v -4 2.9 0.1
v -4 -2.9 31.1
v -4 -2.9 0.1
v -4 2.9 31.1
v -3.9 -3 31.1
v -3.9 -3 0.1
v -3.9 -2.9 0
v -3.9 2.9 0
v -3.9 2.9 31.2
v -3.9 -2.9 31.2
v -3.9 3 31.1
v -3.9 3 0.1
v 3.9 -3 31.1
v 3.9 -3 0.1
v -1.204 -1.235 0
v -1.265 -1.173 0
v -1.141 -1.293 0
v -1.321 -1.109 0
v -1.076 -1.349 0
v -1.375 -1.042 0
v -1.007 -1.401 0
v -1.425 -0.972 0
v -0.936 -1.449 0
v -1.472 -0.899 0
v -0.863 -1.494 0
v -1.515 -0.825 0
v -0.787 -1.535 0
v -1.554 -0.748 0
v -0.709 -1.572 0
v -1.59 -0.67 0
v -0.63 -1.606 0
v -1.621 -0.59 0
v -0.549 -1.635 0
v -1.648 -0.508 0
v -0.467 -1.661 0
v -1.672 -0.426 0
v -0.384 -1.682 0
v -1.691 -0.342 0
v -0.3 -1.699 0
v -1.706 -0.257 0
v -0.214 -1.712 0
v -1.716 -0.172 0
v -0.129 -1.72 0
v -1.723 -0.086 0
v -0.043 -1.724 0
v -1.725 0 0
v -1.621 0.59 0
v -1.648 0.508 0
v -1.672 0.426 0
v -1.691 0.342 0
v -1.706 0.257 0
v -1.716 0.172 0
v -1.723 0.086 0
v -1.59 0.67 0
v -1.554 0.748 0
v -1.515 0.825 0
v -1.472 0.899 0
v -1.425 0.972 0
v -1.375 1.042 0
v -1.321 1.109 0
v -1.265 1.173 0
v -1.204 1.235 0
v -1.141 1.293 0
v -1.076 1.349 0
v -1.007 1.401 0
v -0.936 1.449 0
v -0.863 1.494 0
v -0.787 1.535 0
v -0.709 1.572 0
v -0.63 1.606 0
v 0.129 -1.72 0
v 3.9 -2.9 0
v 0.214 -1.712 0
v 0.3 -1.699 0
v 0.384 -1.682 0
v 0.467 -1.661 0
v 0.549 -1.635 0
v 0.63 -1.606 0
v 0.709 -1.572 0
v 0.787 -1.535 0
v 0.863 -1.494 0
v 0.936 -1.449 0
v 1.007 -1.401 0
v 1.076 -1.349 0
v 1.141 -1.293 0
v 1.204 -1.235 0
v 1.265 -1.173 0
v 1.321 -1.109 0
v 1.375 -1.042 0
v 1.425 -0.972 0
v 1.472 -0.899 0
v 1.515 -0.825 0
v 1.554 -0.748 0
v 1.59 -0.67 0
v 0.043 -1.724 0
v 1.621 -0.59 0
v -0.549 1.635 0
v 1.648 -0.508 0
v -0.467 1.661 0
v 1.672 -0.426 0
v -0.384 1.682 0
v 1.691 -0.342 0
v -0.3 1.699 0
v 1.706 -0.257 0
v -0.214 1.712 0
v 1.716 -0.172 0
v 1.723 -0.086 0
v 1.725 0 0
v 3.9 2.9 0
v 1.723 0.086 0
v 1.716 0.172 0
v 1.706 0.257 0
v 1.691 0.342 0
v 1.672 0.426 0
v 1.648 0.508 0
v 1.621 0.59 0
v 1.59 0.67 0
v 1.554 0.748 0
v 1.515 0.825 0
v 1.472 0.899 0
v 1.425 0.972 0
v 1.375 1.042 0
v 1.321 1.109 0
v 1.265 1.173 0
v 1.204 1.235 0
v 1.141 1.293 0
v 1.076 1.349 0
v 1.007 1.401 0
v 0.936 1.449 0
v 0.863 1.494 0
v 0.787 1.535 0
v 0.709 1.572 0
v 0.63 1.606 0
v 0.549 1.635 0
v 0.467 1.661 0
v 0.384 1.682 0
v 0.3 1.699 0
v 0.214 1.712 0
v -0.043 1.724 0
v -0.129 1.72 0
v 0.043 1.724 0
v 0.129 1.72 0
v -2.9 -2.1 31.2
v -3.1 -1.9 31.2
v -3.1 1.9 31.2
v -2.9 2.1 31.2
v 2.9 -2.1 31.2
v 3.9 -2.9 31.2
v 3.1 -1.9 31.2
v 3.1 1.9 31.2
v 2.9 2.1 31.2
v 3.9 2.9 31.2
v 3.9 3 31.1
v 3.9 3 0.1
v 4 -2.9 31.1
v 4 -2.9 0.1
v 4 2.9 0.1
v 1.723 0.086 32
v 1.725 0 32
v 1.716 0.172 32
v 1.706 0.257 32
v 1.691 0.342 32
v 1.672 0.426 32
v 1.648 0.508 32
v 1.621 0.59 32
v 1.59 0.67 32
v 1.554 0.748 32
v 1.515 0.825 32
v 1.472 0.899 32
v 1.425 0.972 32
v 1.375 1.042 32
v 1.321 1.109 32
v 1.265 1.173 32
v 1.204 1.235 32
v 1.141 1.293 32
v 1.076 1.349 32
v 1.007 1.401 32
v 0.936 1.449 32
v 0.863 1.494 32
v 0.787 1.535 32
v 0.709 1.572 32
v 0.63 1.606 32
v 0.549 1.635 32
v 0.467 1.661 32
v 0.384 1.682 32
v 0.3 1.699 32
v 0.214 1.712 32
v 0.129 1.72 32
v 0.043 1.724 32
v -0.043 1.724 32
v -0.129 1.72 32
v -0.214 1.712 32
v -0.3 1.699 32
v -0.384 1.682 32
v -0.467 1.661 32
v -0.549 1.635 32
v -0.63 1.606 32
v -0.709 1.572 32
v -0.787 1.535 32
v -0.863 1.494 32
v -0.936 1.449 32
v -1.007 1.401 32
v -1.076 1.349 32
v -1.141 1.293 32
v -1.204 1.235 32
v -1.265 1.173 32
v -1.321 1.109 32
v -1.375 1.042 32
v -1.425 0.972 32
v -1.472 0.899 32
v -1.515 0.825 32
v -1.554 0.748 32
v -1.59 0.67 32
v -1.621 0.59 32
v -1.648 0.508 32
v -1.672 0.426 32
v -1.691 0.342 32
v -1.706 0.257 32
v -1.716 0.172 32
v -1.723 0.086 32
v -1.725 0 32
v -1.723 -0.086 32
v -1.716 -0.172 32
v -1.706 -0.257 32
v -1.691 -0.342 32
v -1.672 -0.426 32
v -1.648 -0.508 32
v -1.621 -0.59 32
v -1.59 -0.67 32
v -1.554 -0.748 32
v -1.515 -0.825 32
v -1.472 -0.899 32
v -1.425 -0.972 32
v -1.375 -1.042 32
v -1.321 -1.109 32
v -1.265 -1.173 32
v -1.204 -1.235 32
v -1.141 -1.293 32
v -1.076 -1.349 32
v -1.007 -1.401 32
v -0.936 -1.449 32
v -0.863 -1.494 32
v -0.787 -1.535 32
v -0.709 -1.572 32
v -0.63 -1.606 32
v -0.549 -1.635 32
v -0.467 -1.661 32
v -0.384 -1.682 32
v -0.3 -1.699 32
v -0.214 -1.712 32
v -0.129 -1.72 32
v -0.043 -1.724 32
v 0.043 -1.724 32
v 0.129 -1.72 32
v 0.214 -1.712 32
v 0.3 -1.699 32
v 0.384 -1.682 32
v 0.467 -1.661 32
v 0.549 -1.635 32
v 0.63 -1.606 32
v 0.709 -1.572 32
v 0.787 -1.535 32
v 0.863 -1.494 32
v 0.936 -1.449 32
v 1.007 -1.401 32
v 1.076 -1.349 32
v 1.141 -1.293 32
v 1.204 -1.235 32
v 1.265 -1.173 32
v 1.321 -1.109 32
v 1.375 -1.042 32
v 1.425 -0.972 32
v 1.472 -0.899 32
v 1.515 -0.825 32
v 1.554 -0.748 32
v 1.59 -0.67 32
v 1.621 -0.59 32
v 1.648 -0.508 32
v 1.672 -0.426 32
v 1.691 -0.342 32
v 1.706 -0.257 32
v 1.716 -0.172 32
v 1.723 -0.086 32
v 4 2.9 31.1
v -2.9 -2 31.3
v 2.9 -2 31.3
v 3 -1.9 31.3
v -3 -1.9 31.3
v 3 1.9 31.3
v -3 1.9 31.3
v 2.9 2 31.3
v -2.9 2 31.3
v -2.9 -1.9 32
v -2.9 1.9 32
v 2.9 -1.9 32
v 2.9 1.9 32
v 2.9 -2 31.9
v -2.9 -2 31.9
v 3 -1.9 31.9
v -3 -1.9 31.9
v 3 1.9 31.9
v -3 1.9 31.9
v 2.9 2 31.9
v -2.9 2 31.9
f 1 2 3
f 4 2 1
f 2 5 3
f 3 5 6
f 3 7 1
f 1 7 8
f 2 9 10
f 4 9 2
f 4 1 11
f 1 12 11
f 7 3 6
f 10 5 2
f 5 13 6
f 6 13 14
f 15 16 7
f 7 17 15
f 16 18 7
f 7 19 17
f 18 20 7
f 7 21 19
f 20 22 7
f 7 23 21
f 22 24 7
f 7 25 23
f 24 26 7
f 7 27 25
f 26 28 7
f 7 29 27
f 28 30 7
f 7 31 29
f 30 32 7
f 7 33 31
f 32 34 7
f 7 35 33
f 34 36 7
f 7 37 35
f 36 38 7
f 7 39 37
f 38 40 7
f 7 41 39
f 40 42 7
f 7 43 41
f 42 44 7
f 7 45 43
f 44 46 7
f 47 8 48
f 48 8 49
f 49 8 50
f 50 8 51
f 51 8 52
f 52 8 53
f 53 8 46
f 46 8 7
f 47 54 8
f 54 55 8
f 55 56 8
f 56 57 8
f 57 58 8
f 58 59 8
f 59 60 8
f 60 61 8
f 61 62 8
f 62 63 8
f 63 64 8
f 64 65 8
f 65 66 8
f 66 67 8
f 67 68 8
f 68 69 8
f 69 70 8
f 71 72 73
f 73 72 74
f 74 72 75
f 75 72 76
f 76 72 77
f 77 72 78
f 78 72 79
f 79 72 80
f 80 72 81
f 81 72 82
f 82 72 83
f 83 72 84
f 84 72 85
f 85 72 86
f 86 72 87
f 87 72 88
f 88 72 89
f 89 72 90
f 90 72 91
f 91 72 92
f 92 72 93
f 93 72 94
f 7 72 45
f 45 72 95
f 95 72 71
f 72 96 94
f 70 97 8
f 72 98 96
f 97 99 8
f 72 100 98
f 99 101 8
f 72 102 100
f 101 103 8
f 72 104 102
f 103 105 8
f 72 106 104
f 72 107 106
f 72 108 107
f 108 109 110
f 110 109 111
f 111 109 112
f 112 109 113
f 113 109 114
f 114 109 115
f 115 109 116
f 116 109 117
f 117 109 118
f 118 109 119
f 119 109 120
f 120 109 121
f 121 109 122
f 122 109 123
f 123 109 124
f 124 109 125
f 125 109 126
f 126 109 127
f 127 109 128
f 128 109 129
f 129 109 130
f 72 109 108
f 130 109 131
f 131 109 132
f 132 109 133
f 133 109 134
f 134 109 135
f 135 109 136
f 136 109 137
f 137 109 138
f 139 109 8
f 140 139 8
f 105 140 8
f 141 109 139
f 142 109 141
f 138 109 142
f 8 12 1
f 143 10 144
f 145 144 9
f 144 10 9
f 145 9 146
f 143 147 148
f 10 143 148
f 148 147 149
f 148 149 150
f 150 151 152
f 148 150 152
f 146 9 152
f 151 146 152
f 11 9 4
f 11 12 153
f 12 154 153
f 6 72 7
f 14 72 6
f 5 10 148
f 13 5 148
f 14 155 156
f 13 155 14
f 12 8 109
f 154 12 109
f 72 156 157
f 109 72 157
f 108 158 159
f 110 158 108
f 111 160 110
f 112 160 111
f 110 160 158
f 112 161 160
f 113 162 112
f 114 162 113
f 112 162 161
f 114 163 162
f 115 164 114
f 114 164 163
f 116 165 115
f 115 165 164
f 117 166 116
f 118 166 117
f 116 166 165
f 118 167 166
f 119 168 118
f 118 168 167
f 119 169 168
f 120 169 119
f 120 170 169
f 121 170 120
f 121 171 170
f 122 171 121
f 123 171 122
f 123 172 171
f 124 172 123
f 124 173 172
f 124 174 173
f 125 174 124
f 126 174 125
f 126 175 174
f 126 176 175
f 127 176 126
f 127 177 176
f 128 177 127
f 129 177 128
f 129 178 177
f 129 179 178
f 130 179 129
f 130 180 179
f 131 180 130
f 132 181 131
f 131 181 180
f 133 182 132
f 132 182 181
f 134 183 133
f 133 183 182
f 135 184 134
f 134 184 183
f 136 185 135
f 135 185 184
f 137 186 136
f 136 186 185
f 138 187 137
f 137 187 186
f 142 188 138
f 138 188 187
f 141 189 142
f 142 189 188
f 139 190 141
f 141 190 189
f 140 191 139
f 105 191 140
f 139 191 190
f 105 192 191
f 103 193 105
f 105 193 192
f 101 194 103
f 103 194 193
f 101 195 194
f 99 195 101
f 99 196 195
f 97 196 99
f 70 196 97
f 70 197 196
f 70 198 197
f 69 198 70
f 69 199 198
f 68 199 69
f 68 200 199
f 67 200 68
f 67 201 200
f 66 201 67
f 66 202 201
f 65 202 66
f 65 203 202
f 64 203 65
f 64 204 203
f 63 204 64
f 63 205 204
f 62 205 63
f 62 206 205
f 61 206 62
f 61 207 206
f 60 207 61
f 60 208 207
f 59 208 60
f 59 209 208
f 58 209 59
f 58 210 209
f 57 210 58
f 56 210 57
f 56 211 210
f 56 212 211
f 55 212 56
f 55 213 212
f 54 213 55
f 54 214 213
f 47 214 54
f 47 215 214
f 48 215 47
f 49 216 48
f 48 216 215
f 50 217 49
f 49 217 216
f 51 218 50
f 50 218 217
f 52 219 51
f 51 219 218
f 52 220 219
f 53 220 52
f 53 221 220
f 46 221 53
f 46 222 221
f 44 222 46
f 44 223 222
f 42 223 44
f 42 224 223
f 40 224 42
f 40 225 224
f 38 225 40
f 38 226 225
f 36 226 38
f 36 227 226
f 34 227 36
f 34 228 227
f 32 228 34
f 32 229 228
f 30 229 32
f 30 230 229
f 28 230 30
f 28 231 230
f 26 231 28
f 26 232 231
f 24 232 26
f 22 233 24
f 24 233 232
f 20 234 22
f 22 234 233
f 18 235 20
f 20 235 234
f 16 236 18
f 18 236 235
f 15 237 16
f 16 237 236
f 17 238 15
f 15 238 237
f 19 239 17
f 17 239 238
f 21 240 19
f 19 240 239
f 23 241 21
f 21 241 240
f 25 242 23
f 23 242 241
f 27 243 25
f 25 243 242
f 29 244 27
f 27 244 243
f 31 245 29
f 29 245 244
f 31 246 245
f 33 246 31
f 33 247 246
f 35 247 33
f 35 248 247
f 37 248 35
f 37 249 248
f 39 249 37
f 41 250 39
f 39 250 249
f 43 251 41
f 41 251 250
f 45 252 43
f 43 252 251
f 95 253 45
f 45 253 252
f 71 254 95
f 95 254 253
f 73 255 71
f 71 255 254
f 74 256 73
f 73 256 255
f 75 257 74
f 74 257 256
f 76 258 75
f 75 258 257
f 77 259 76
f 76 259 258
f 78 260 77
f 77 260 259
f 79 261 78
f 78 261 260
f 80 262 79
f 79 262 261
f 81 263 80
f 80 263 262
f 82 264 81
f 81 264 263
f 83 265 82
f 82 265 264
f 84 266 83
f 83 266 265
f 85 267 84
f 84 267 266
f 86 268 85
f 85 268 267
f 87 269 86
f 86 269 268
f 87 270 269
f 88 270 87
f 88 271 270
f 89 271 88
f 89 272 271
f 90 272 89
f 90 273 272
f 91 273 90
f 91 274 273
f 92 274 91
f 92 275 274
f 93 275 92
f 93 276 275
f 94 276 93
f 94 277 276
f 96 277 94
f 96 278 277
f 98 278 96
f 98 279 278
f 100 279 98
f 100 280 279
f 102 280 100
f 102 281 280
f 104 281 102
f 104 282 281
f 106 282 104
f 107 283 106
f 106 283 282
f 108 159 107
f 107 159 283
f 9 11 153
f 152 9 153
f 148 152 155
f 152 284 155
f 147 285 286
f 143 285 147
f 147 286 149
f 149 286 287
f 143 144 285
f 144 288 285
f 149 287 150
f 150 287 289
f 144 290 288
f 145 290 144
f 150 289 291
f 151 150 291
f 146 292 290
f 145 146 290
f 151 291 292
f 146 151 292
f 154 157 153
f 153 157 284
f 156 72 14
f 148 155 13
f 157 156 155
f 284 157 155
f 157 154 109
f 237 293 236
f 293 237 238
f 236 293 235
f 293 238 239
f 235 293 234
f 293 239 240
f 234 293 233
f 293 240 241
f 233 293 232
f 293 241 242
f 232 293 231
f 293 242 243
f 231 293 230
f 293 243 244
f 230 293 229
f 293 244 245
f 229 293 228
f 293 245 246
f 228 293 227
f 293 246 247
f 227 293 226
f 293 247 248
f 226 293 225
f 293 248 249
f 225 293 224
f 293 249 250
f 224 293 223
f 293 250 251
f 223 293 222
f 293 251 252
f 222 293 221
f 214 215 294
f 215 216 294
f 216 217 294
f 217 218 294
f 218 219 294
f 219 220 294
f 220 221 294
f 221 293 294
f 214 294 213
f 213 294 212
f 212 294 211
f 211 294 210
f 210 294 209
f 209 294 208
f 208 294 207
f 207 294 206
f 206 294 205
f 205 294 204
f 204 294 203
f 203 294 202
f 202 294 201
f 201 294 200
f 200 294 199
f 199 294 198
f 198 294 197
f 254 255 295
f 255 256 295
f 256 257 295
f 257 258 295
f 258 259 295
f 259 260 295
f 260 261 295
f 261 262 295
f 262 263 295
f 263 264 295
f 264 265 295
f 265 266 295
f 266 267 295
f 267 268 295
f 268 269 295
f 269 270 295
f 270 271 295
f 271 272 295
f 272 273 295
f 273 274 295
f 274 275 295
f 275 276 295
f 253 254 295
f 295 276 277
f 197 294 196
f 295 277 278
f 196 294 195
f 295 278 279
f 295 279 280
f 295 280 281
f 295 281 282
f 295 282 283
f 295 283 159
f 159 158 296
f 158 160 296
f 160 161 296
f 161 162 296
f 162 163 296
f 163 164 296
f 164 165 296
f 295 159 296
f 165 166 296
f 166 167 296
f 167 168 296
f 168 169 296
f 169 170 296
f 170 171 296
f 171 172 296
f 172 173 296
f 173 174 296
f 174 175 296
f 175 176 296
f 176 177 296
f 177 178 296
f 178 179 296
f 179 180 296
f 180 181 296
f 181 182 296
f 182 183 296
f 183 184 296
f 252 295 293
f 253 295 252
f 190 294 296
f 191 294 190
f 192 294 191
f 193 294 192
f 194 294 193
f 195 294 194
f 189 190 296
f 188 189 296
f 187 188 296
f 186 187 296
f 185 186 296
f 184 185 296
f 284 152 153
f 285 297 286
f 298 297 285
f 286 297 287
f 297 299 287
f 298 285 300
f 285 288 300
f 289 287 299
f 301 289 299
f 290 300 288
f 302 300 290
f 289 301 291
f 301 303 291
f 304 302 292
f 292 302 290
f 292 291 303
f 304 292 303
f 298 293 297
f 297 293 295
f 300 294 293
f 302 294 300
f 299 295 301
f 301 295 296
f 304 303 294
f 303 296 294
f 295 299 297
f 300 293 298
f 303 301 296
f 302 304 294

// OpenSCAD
// Generated by spec/build_parent_gnss.py; dimensions and edge finishing are parametric there.
polyhedron(points=[[-4.0, -2.9000000953674316, 0.10000000149011612], [-4.0, -2.9000000953674316, 31.100000381469727], [-4.0, 2.9000000953674316, 0.10000000149011612], [-4.0, 2.9000000953674316, 31.100000381469727], [-3.9000000953674316, -3.0, 31.100000381469727], [-3.9000000953674316, -3.0, 0.10000000149011612], [-3.9000000953674316, -2.9000000953674316, -1.942890293094024e-16], [-3.9000000953674316, 2.9000000953674316, -1.9081958235744878e-16], [-3.9000000953674316, -2.9000000953674316, 31.200000762939453], [-3.9000000953674316, 2.9000000953674316, 31.200000762939453], [-3.9000000953674316, 3.0, 31.100000381469727], [-3.9000000953674316, 3.0, 0.10000000149011612], [3.9000000953674316, -3.0, 31.100000381469727], [3.9000000953674316, -3.0, 0.10000000149011612], [-1.264514446258545, -1.1732980012893677, 0.0], [-1.204458475112915, -1.2348703145980835, 0.0], [-1.141408085823059, -1.293372631072998, 0.0], [-1.3214266300201416, -1.1088086366653442, 0.0], [-1.0755199193954468, -1.3486592769622803, 0.0], [-1.3750535249710083, -1.041562557220459, 0.0], [-1.0069578886032104, -1.4005930423736572, 0.0], [-1.4252618551254272, -0.9717270731925964, 0.0], [-0.9358922839164734, -1.4490447044372559, 0.0], [-1.4719268083572388, -0.8994757533073425, 0.0], [-0.862500011920929, -1.4938938617706299, 0.0], [-1.5149321556091309, -0.8249881267547607, 0.0], [-0.7869634032249451, -1.5350288152694702, 0.0], [-1.5541713237762451, -0.748449444770813, 0.0], [-0.709470272064209, -1.572347640991211, 0.0], [-1.5895464420318604, -0.6700500249862671, 0.0], [-0.6302132606506348, -1.605757236480713, 0.0], [-1.6209697723388672, -0.5899847745895386, 0.0], [-0.5493894815444946, -1.6351746320724487, 0.0], [-1.6483631134033203, -0.5084526538848877, 0.0], [-0.46719980239868164, -1.6605268716812134, 0.0], [-1.6716582775115967, -0.4256564974784851, 0.0], [-0.3838486075401306, -1.6817506551742554, 0.0], [-1.6907975673675537, -0.34180209040641785, 0.0], [-0.2995431125164032, -1.6987934112548828, 0.0], [-1.7057331800460815, -0.25709789991378784, 0.0], [-0.21449288725852966, -1.711612582206726, 0.0], [-1.7164280414581299, -0.17175453901290894, 0.0], [-0.1289094090461731, -1.7201765775680542, 0.0], [-1.7228556871414185, -0.08598415553569794, 0.0], [-0.04300544410943985, -1.7244638204574585, 0.0], [-1.725000023841858, -5.917179469523042e-15, 0.0], [-1.6483631134033203, 0.5084526538848877, 0.0], [-1.6209697723388672, 0.5899847745895386, 0.0], [-1.6716582775115967, 0.4256564974784851, 0.0], [-1.6907975673675537, 0.34180209040641785, 0.0], [-1.7057331800460815, 0.25709789991378784, 0.0], [-1.7164280414581299, 0.17175453901290894, 0.0], [-1.7228556871414185, 0.08598415553569794, 0.0], [-1.5895464420318604, 0.6700500249862671, 0.0], [-1.5541713237762451, 0.748449444770813, 0.0], [-1.5149321556091309, 0.8249881267547607, 0.0], [-1.4719268083572388, 0.8994757533073425, 0.0], [-1.4252618551254272, 0.9717270731925964, 0.0], [-1.3750535249710083, 1.041562557220459, 0.0], [-1.3214266300201416, 1.1088086366653442, 0.0], [-1.264514446258545, 1.1732980012893677, 0.0], [-1.204458475112915, 1.2348703145980835, 0.0], [-1.141408085823059, 1.293372631072998, 0.0], [-1.0755199193954468, 1.3486592769622803, 0.0], [-1.0069578886032104, 1.4005930423736572, 0.0], [-0.9358922839164734, 1.4490447044372559, 0.0], [-0.862500011920929, 1.4938938617706299, 0.0], [-0.7869634032249451, 1.5350288152694702, 0.0], [-0.709470272064209, 1.572347640991211, 0.0], [-0.6302132606506348, 1.605757236480713, 0.0], [0.21449288725852966, -1.711612582206726, 0.0], [3.9000000953674316, -2.9000000953674316, -1.97758476261356e-16], [0.1289094090461731, -1.7201765775680542, 0.0], [0.2995431125164032, -1.6987934112548828, 0.0], [0.3838486075401306, -1.6817506551742554, 0.0], [0.46719980239868164, -1.6605268716812134, 0.0], [0.5493894815444946, -1.6351746320724487, 0.0], [0.6302132606506348, -1.605757236480713, 0.0], [0.709470272064209, -1.572347640991211, 0.0], [0.7869634032249451, -1.5350288152694702, 0.0], [0.862500011920929, -1.4938938617706299, 0.0], [0.9358922839164734, -1.4490447044372559, 0.0], [1.0069578886032104, -1.4005930423736572, 0.0], [1.0755199193954468, -1.3486592769622803, 0.0], [1.141408085823059, -1.293372631072998, 0.0], [1.204458475112915, -1.2348703145980835, 0.0], [1.264514446258545, -1.1732980012893677, 0.0], [1.3214266300201416, -1.1088086366653442, 0.0], [1.3750535249710083, -1.041562557220459, 0.0], [1.4252618551254272, -0.9717270731925964, 0.0], [1.4719268083572388, -0.8994757533073425, 0.0], [1.5149321556091309, -0.8249881267547607, 0.0], [1.5541713237762451, -0.748449444770813, 0.0], [1.5895464420318604, -0.6700500249862671, 0.0], [0.04300544410943985, -1.7244638204574585, 0.0], [1.6209697723388672, -0.5899847745895386, 0.0], [-0.5493894815444946, 1.6351746320724487, 0.0], [1.6483631134033203, -0.5084526538848877, 0.0], [-0.46719980239868164, 1.6605268716812134, 0.0], [1.6716582775115967, -0.4256564974784851, 0.0], [-0.3838486075401306, 1.6817506551742554, 0.0], [1.6907975673675537, -0.34180209040641785, 0.0], [-0.2995431125164032, 1.6987934112548828, 0.0], [1.7057331800460815, -0.25709789991378784, 0.0], [-0.21449288725852966, 1.711612582206726, 0.0], [1.7164280414581299, -0.17175453901290894, 0.0], [1.7228556871414185, -0.08598415553569794, 0.0], [1.725000023841858, -4.22503157524438e-16, 0.0], [1.7228556871414185, 0.08598415553569794, 0.0], [3.9000000953674316, 2.9000000953674316, -1.942890293094024e-16], [1.7164280414581299, 0.17175453901290894, 0.0], [1.7057331800460815, 0.25709789991378784, 0.0], [1.6907975673675537, 0.34180209040641785, 0.0], [1.6716582775115967, 0.4256564974784851, 0.0], [1.6483631134033203, 0.5084526538848877, 0.0], [1.6209697723388672, 0.5899847745895386, 0.0], [1.5895464420318604, 0.6700500249862671, 0.0], [1.5541713237762451, 0.748449444770813, 0.0], [1.5149321556091309, 0.8249881267547607, 0.0], [1.4719268083572388, 0.8994757533073425, 0.0], [1.4252618551254272, 0.9717270731925964, 0.0], [1.3750535249710083, 1.041562557220459, 0.0], [1.3214266300201416, 1.1088086366653442, 0.0], [1.264514446258545, 1.1732980012893677, 0.0], [1.204458475112915, 1.2348703145980835, 0.0], [1.141408085823059, 1.293372631072998, 0.0], [1.0755199193954468, 1.3486592769622803, 0.0], [1.0069578886032104, 1.4005930423736572, 0.0], [0.9358922839164734, 1.4490447044372559, 0.0], [0.862500011920929, 1.4938938617706299, 0.0], [0.7869634032249451, 1.5350288152694702, 0.0], [0.709470272064209, 1.572347640991211, 0.0], [0.6302132606506348, 1.605757236480713, 0.0], [0.5493894815444946, 1.6351746320724487, 0.0], [0.46719980239868164, 1.6605268716812134, 0.0], [0.3838486075401306, 1.6817506551742554, 0.0], [0.2995431125164032, 1.6987934112548828, 0.0], [0.21449288725852966, 1.711612582206726, 0.0], [-0.04300544410943985, 1.7244638204574585, 0.0], [-0.1289094090461731, 1.7201765775680542, 0.0], [0.04300544410943985, 1.7244638204574585, 0.0], [0.1289094090461731, 1.7201765775680542, 0.0], [-3.0999999046325684, -1.899999976158142, 31.200000762939453], [-2.9000000953674316, -2.0999999046325684, 31.200000762939453], [-3.0999999046325684, 1.899999976158142, 31.200000762939453], [-2.9000000953674316, 2.0999999046325684, 31.200000762939453], [3.9000000953674316, -2.9000000953674316, 31.200000762939453], [2.9000000953674316, -2.0999999046325684, 31.200000762939453], [3.0999999046325684, -1.899999976158142, 31.200000762939453], [3.0999999046325684, 1.899999976158142, 31.200000762939453], [3.9000000953674316, 2.9000000953674316, 31.200000762939453], [2.9000000953674316, 2.0999999046325684, 31.200000762939453], [3.9000000953674316, 3.0, 31.100000381469727], [3.9000000953674316, 3.0, 0.10000000149011612], [4.0, -2.9000000953674316, 0.10000000149011612], [4.0, -2.9000000953674316, 31.100000381469727], [4.0, 2.9000000953674316, 0.10000000149011612], [1.725000023841858, -4.22503157524438e-16, 32.0], [1.7228556871414185, 0.08598415553569794, 32.0], [1.7164280414581299, 0.17175453901290894, 32.0], [1.7057331800460815, 0.25709789991378784, 32.0], [1.6907975673675537, 0.34180209040641785, 32.0], [1.6716582775115967, 0.4256564974784851, 32.0], [1.6483631134033203, 0.5084526538848877, 32.0], [1.6209697723388672, 0.5899847745895386, 32.0], [1.5895464420318604, 0.6700500249862671, 32.0], [1.5541713237762451, 0.748449444770813, 32.0], [1.5149321556091309, 0.8249881267547607, 32.0], [1.4719268083572388, 0.8994757533073425, 32.0], [1.4252618551254272, 0.9717270731925964, 32.0], [1.3750535249710083, 1.041562557220459, 32.0], [1.3214266300201416, 1.1088086366653442, 32.0], [1.264514446258545, 1.1732980012893677, 32.0], [1.204458475112915, 1.2348703145980835, 32.0], [1.141408085823059, 1.293372631072998, 32.0], [1.0755199193954468, 1.3486592769622803, 32.0], [1.0069578886032104, 1.4005930423736572, 32.0], [0.9358922839164734, 1.4490447044372559, 32.0], [0.862500011920929, 1.4938938617706299, 32.0], [0.7869634032249451, 1.5350288152694702, 32.0], [0.709470272064209, 1.572347640991211, 32.0], [0.6302132606506348, 1.605757236480713, 32.0], [0.5493894815444946, 1.6351746320724487, 32.0], [0.46719980239868164, 1.6605268716812134, 32.0], [0.3838486075401306, 1.6817506551742554, 32.0], [0.2995431125164032, 1.6987934112548828, 32.0], [0.21449288725852966, 1.711612582206726, 32.0], [0.1289094090461731, 1.7201765775680542, 32.0], [0.04300544410943985, 1.7244638204574585, 32.0], [-0.04300544410943985, 1.7244638204574585, 32.0], [-0.1289094090461731, 1.7201765775680542, 32.0], [-0.21449288725852966, 1.711612582206726, 32.0], [-0.2995431125164032, 1.6987934112548828, 32.0], [-0.3838486075401306, 1.6817506551742554, 32.0], [-0.46719980239868164, 1.6605268716812134, 32.0], [-0.5493894815444946, 1.6351746320724487, 32.0], [-0.6302132606506348, 1.605757236480713, 32.0], [-0.709470272064209, 1.572347640991211, 32.0], [-0.7869634032249451, 1.5350288152694702, 32.0], [-0.862500011920929, 1.4938938617706299, 32.0], [-0.9358922839164734, 1.4490447044372559, 32.0], [-1.0069578886032104, 1.4005930423736572, 32.0], [-1.0755199193954468, 1.3486592769622803, 32.0], [-1.141408085823059, 1.293372631072998, 32.0], [-1.204458475112915, 1.2348703145980835, 32.0], [-1.264514446258545, 1.1732980012893677, 32.0], [-1.3214266300201416, 1.1088086366653442, 32.0], [-1.3750535249710083, 1.041562557220459, 32.0], [-1.4252618551254272, 0.9717270731925964, 32.0], [-1.4719268083572388, 0.8994757533073425, 32.0], [-1.5149321556091309, 0.8249881267547607, 32.0], [-1.5541713237762451, 0.748449444770813, 32.0], [-1.5895464420318604, 0.6700500249862671, 32.0], [-1.6209697723388672, 0.5899847745895386, 32.0], [-1.6483631134033203, 0.5084526538848877, 32.0], [-1.6716582775115967, 0.4256564974784851, 32.0], [-1.6907975673675537, 0.34180209040641785, 32.0], [-1.7057331800460815, 0.25709789991378784, 32.0], [-1.7164280414581299, 0.17175453901290894, 32.0], [-1.7228556871414185, 0.08598415553569794, 32.0], [-1.725000023841858, -5.917179469523042e-15, 32.0], [-1.7228556871414185, -0.08598415553569794, 32.0], [-1.7164280414581299, -0.17175453901290894, 32.0], [-1.7057331800460815, -0.25709789991378784, 32.0], [-1.6907975673675537, -0.34180209040641785, 32.0], [-1.6716582775115967, -0.4256564974784851, 32.0], [-1.6483631134033203, -0.5084526538848877, 32.0], [-1.6209697723388672, -0.5899847745895386, 32.0], [-1.5895464420318604, -0.6700500249862671, 32.0], [-1.5541713237762451, -0.748449444770813, 32.0], [-1.5149321556091309, -0.8249881267547607, 32.0], [-1.4719268083572388, -0.8994757533073425, 32.0], [-1.4252618551254272, -0.9717270731925964, 32.0], [-1.3750535249710083, -1.041562557220459, 32.0], [-1.3214266300201416, -1.1088086366653442, 32.0], [-1.264514446258545, -1.1732980012893677, 32.0], [-1.204458475112915, -1.2348703145980835, 32.0], [-1.141408085823059, -1.293372631072998, 32.0], [-1.0755199193954468, -1.3486592769622803, 32.0], [-1.0069578886032104, -1.4005930423736572, 32.0], [-0.9358922839164734, -1.4490447044372559, 32.0], [-0.862500011920929, -1.4938938617706299, 32.0], [-0.7869634032249451, -1.5350288152694702, 32.0], [-0.709470272064209, -1.572347640991211, 32.0], [-0.6302132606506348, -1.605757236480713, 32.0], [-0.5493894815444946, -1.6351746320724487, 32.0], [-0.46719980239868164, -1.6605268716812134, 32.0], [-0.3838486075401306, -1.6817506551742554, 32.0], [-0.2995431125164032, -1.6987934112548828, 32.0], [-0.21449288725852966, -1.711612582206726, 32.0], [-0.1289094090461731, -1.7201765775680542, 32.0], [-0.04300544410943985, -1.7244638204574585, 32.0], [0.04300544410943985, -1.7244638204574585, 32.0], [0.1289094090461731, -1.7201765775680542, 32.0], [0.21449288725852966, -1.711612582206726, 32.0], [0.2995431125164032, -1.6987934112548828, 32.0], [0.3838486075401306, -1.6817506551742554, 32.0], [0.46719980239868164, -1.6605268716812134, 32.0], [0.5493894815444946, -1.6351746320724487, 32.0], [0.6302132606506348, -1.605757236480713, 32.0], [0.709470272064209, -1.572347640991211, 32.0], [0.7869634032249451, -1.5350288152694702, 32.0], [0.862500011920929, -1.4938938617706299, 32.0], [0.9358922839164734, -1.4490447044372559, 32.0], [1.0069578886032104, -1.4005930423736572, 32.0], [1.0755199193954468, -1.3486592769622803, 32.0], [1.141408085823059, -1.293372631072998, 32.0], [1.204458475112915, -1.2348703145980835, 32.0], [1.264514446258545, -1.1732980012893677, 32.0], [1.3214266300201416, -1.1088086366653442, 32.0], [1.3750535249710083, -1.041562557220459, 32.0], [1.4252618551254272, -0.9717270731925964, 32.0], [1.4719268083572388, -0.8994757533073425, 32.0], [1.5149321556091309, -0.8249881267547607, 32.0], [1.5541713237762451, -0.748449444770813, 32.0], [1.5895464420318604, -0.6700500249862671, 32.0], [1.6209697723388672, -0.5899847745895386, 32.0], [1.6483631134033203, -0.5084526538848877, 32.0], [1.6716582775115967, -0.4256564974784851, 32.0], [1.6907975673675537, -0.34180209040641785, 32.0], [1.7057331800460815, -0.25709789991378784, 32.0], [1.7164280414581299, -0.17175453901290894, 32.0], [1.7228556871414185, -0.08598415553569794, 32.0], [4.0, 2.9000000953674316, 31.100000381469727], [2.9000000953674316, -2.0, 31.299999237060547], [-2.9000000953674316, -2.0, 31.299999237060547], [3.0, -1.899999976158142, 31.299999237060547], [-3.0, -1.899999976158142, 31.299999237060547], [3.0, 1.899999976158142, 31.299999237060547], [-3.0, 1.899999976158142, 31.299999237060547], [2.9000000953674316, 2.0, 31.299999237060547], [-2.9000000953674316, 2.0, 31.299999237060547], [-2.9000000953674316, -1.899999976158142, 32.0], [-2.9000000953674316, 1.899999976158142, 32.0], [2.9000000953674316, -1.899999976158142, 32.0], [2.9000000953674316, 1.899999976158142, 32.0], [2.9000000953674316, -2.0, 31.899999618530273], [-2.9000000953674316, -2.0, 31.899999618530273], [3.0, -1.899999976158142, 31.899999618530273], [-3.0, -1.899999976158142, 31.899999618530273], [3.0, 1.899999976158142, 31.899999618530273], [-3.0, 1.899999976158142, 31.899999618530273], [2.9000000953674316, 2.0, 31.899999618530273], [-2.9000000953674316, 2.0, 31.899999618530273]],faces=[[0, 1, 2], [2, 1, 3], [0, 4, 1], [5, 4, 0], [2, 6, 0], [7, 6, 2], [8, 9, 1], [1, 9, 3], [10, 2, 3], [10, 11, 2], [5, 0, 6], [1, 4, 8], [5, 12, 4], [13, 12, 5], [6, 14, 15], [15, 16, 6], [6, 17, 14], [16, 18, 6], [6, 19, 17], [18, 20, 6], [6, 21, 19], [20, 22, 6], [6, 23, 21], [22, 24, 6], [6, 25, 23], [24, 26, 6], [6, 27, 25], [26, 28, 6], [6, 29, 27], [28, 30, 6], [6, 31, 29], [30, 32, 6], [6, 33, 31], [32, 34, 6], [6, 35, 33], [34, 36, 6], [6, 37, 35], [36, 38, 6], [6, 39, 37], [38, 40, 6], [6, 41, 39], [40, 42, 6], [6, 43, 41], [42, 44, 6], [6, 45, 43], [46, 7, 47], [48, 7, 46], [49, 7, 48], [50, 7, 49], [51, 7, 50], [52, 7, 51], [45, 7, 52], [6, 7, 45], [7, 53, 47], [7, 54, 53], [7, 55, 54], [7, 56, 55], [7, 57, 56], [7, 58, 57], [7, 59, 58], [7, 60, 59], [7, 61, 60], [7, 62, 61], [7, 63, 62], [7, 64, 63], [7, 65, 64], [7, 66, 65], [7, 67, 66], [7, 68, 67], [7, 69, 68], [70, 71, 72], [73, 71, 70], [74, 71, 73], [75, 71, 74], [76, 71, 75], [77, 71, 76], [78, 71, 77], [79, 71, 78], [80, 71, 79], [81, 71, 80], [82, 71, 81], [83, 71, 82], [84, 71, 83], [85, 71, 84], [86, 71, 85], [87, 71, 86], [88, 71, 87], [89, 71, 88], [90, 71, 89], [91, 71, 90], [92, 71, 91], [93, 71, 92], [44, 71, 6], [94, 71, 44], [72, 71, 94], [93, 95, 71], [7, 96, 69], [95, 97, 71], [7, 98, 96], [97, 99, 71], [7, 100, 98], [99, 101, 71], [7, 102, 100], [101, 103, 71], [7, 104, 102], [103, 105, 71], [105, 106, 71], [106, 107, 71], [108, 109, 107], [110, 109, 108], [111, 109, 110], [112, 109, 111], [113, 109, 112], [114, 109, 113], [115, 109, 114], [116, 109, 115], [117, 109, 116], [118, 109, 117], [119, 109, 118], [120, 109, 119], [121, 109, 120], [122, 109, 121], [123, 109, 122], [124, 109, 123], [125, 109, 124], [126, 109, 125], [127, 109, 126], [128, 109, 127], [129, 109, 128], [107, 109, 71], [130, 109, 129], [131, 109, 130], [132, 109, 131], [133, 109, 132], [134, 109, 133], [135, 109, 134], [136, 109, 135], [137, 109, 136], [7, 109, 138], [7, 138, 139], [7, 139, 104], [138, 109, 140], [140, 109, 141], [141, 109, 137], [2, 11, 7], [142, 8, 143], [9, 142, 144], [9, 8, 142], [145, 9, 144], [146, 147, 143], [146, 143, 8], [148, 147, 146], [149, 148, 146], [150, 151, 149], [150, 149, 146], [150, 9, 145], [150, 145, 151], [3, 9, 10], [152, 11, 10], [152, 153, 11], [6, 71, 5], [5, 71, 13], [146, 8, 4], [146, 4, 12], [154, 155, 13], [13, 155, 12], [109, 7, 11], [109, 11, 153], [156, 154, 71], [156, 71, 109], [157, 158, 107], [107, 158, 108], [108, 159, 110], [110, 159, 111], [158, 159, 108], [159, 160, 111], [111, 161, 112], [112, 161, 113], [160, 161, 111], [161, 162, 113], [113, 163, 114], [162, 163, 113], [114, 164, 115], [163, 164, 114], [115, 165, 116], [116, 165, 117], [164, 165, 115], [165, 166, 117], [117, 167, 118], [166, 167, 117], [167, 168, 118], [118, 168, 119], [168, 169, 119], [119, 169, 120], [169, 170, 120], [120, 170, 121], [121, 170, 122], [170, 171, 122], [122, 171, 123], [171, 172, 123], [172, 173, 123], [123, 173, 124], [124, 173, 125], [173, 174, 125], [174, 175, 125], [125, 175, 126], [175, 176, 126], [126, 176, 127], [127, 176, 128], [176, 177, 128], [177, 178, 128], [128, 178, 129], [178, 179, 129], [129, 179, 130], [130, 180, 131], [179, 180, 130], [131, 181, 132], [180, 181, 131], [132, 182, 133], [181, 182, 132], [133, 183, 134], [182, 183, 133], [134, 184, 135], [183, 184, 134], [135, 185, 136], [184, 185, 135], [136, 186, 137], [185, 186, 136], [137, 187, 141], [186, 187, 137], [141, 188, 140], [187, 188, 141], [140, 189, 138], [188, 189, 140], [138, 190, 139], [139, 190, 104], [189, 190, 138], [190, 191, 104], [104, 192, 102], [191, 192, 104], [102, 193, 100], [192, 193, 102], [193, 194, 100], [100, 194, 98], [194, 195, 98], [98, 195, 96], [96, 195, 69], [195, 196, 69], [196, 197, 69], [69, 197, 68], [197, 198, 68], [68, 198, 67], [198, 199, 67], [67, 199, 66], [199, 200, 66], [66, 200, 65], [200, 201, 65], [65, 201, 64], [201, 202, 64], [64, 202, 63], [202, 203, 63], [63, 203, 62], [203, 204, 62], [62, 204, 61], [204, 205, 61], [61, 205, 60], [205, 206, 60], [60, 206, 59], [206, 207, 59], [59, 207, 58], [207, 208, 58], [58, 208, 57], [208, 209, 57], [57, 209, 56], [56, 209, 55], [209, 210, 55], [210, 211, 55], [55, 211, 54], [211, 212, 54], [54, 212, 53], [212, 213, 53], [53, 213, 47], [213, 214, 47], [47, 214, 46], [46, 215, 48], [214, 215, 46], [48, 216, 49], [215, 216, 48], [49, 217, 50], [216, 217, 49], [50, 218, 51], [217, 218, 50], [218, 219, 51], [51, 219, 52], [219, 220, 52], [52, 220, 45], [220, 221, 45], [45, 221, 43], [221, 222, 43], [43, 222, 41], [222, 223, 41], [41, 223, 39], [223, 224, 39], [39, 224, 37], [224, 225, 37], [37, 225, 35], [225, 226, 35], [35, 226, 33], [226, 227, 33], [33, 227, 31], [227, 228, 31], [31, 228, 29], [228, 229, 29], [29, 229, 27], [229, 230, 27], [27, 230, 25], [230, 231, 25], [25, 231, 23], [23, 232, 21], [231, 232, 23], [21, 233, 19], [232, 233, 21], [19, 234, 17], [233, 234, 19], [17, 235, 14], [234, 235, 17], [14, 236, 15], [235, 236, 14], [15, 237, 16], [236, 237, 15], [16, 238, 18], [237, 238, 16], [18, 239, 20], [238, 239, 18], [20, 240, 22], [239, 240, 20], [22, 241, 24], [240, 241, 22], [24, 242, 26], [241, 242, 24], [26, 243, 28], [242, 243, 26], [28, 244, 30], [243, 244, 28], [244, 245, 30], [30, 245, 32], [245, 246, 32], [32, 246, 34], [246, 247, 34], [34, 247, 36], [247, 248, 36], [36, 248, 38], [38, 249, 40], [248, 249, 38], [40, 250, 42], [249, 250, 40], [42, 251, 44], [250, 251, 42], [44, 252, 94], [251, 252, 44], [94, 253, 72], [252, 253, 94], [72, 254, 70], [253, 254, 72], [70, 255, 73], [254, 255, 70], [73, 256, 74], [255, 256, 73], [74, 257, 75], [256, 257, 74], [75, 258, 76], [257, 258, 75], [76, 259, 77], [258, 259, 76], [77, 260, 78], [259, 260, 77], [78, 261, 79], [260, 261, 78], [79, 262, 80], [261, 262, 79], [80, 263, 81], [262, 263, 80], [81, 264, 82], [263, 264, 81], [82, 265, 83], [264, 265, 82], [83, 266, 84], [265, 266, 83], [84, 267, 85], [266, 267, 84], [85, 268, 86], [267, 268, 85], [268, 269, 86], [86, 269, 87], [269, 270, 87], [87, 270, 88], [270, 271, 88], [88, 271, 89], [271, 272, 89], [89, 272, 90], [272, 273, 90], [90, 273, 91], [273, 274, 91], [91, 274, 92], [274, 275, 92], [92, 275, 93], [275, 276, 93], [93, 276, 95], [276, 277, 95], [95, 277, 97], [277, 278, 97], [97, 278, 99], [278, 279, 99], [99, 279, 101], [279, 280, 101], [101, 280, 103], [280, 281, 103], [103, 281, 105], [105, 282, 106], [281, 282, 105], [106, 157, 107], [282, 157, 106], [152, 10, 9], [152, 9, 150], [155, 150, 146], [155, 283, 150], [284, 285, 147], [147, 285, 143], [148, 284, 147], [286, 284, 148], [285, 142, 143], [285, 287, 142], [149, 286, 148], [288, 286, 149], [287, 289, 142], [142, 289, 144], [290, 288, 149], [290, 149, 151], [289, 291, 145], [289, 145, 144], [291, 290, 151], [291, 151, 145], [152, 156, 153], [283, 156, 152], [13, 71, 154], [12, 155, 146], [155, 154, 156], [155, 156, 283], [109, 153, 156], [235, 292, 236], [237, 236, 292], [234, 292, 235], [238, 237, 292], [233, 292, 234], [239, 238, 292], [232, 292, 233], [240, 239, 292], [231, 292, 232], [241, 240, 292], [230, 292, 231], [242, 241, 292], [229, 292, 230], [243, 242, 292], [228, 292, 229], [244, 243, 292], [227, 292, 228], [245, 244, 292], [226, 292, 227], [246, 245, 292], [225, 292, 226], [247, 246, 292], [224, 292, 225], [248, 247, 292], [223, 292, 224], [249, 248, 292], [222, 292, 223], [250, 249, 292], [221, 292, 222], [251, 250, 292], [220, 292, 221], [293, 214, 213], [293, 215, 214], [293, 216, 215], [293, 217, 216], [293, 218, 217], [293, 219, 218], [293, 220, 219], [293, 292, 220], [212, 293, 213], [211, 293, 212], [210, 293, 211], [209, 293, 210], [208, 293, 209], [207, 293, 208], [206, 293, 207], [205, 293, 206], [204, 293, 205], [203, 293, 204], [202, 293, 203], [201, 293, 202], [200, 293, 201], [199, 293, 200], [198, 293, 199], [197, 293, 198], [196, 293, 197], [294, 254, 253], [294, 255, 254], [294, 256, 255], [294, 257, 256], [294, 258, 257], [294, 259, 258], [294, 260, 259], [294, 261, 260], [294, 262, 261], [294, 263, 262], [294, 264, 263], [294, 265, 264], [294, 266, 265], [294, 267, 266], [294, 268, 267], [294, 269, 268], [294, 270, 269], [294, 271, 270], [294, 272, 271], [294, 273, 272], [294, 274, 273], [294, 275, 274], [294, 253, 252], [276, 275, 294], [195, 293, 196], [277, 276, 294], [194, 293, 195], [278, 277, 294], [279, 278, 294], [280, 279, 294], [281, 280, 294], [282, 281, 294], [157, 282, 294], [295, 158, 157], [295, 159, 158], [295, 160, 159], [295, 161, 160], [295, 162, 161], [295, 163, 162], [295, 164, 163], [295, 157, 294], [295, 165, 164], [295, 166, 165], [295, 167, 166], [295, 168, 167], [295, 169, 168], [295, 170, 169], [295, 171, 170], [295, 172, 171], [295, 173, 172], [295, 174, 173], [295, 175, 174], [295, 176, 175], [295, 177, 176], [295, 178, 177], [295, 179, 178], [295, 180, 179], [295, 181, 180], [295, 182, 181], [295, 183, 182], [292, 294, 251], [251, 294, 252], [295, 293, 189], [189, 293, 190], [190, 293, 191], [191, 293, 192], [192, 293, 193], [193, 293, 194], [295, 189, 188], [295, 188, 187], [295, 187, 186], [295, 186, 185], [295, 185, 184], [295, 184, 183], [152, 150, 283], [284, 296, 285], [285, 296, 297], [286, 296, 284], [286, 298, 296], [299, 285, 297], [299, 287, 285], [298, 286, 288], [298, 288, 300], [287, 299, 289], [289, 299, 301], [290, 300, 288], [290, 302, 300], [291, 301, 303], [289, 301, 291], [302, 290, 291], [302, 291, 303], [296, 292, 297], [294, 292, 296], [292, 293, 299], [299, 293, 301], [300, 294, 298], [295, 294, 300], [293, 302, 303], [293, 295, 302], [296, 298, 294], [297, 292, 299], [295, 300, 302], [293, 303, 301]],convexity=10);
